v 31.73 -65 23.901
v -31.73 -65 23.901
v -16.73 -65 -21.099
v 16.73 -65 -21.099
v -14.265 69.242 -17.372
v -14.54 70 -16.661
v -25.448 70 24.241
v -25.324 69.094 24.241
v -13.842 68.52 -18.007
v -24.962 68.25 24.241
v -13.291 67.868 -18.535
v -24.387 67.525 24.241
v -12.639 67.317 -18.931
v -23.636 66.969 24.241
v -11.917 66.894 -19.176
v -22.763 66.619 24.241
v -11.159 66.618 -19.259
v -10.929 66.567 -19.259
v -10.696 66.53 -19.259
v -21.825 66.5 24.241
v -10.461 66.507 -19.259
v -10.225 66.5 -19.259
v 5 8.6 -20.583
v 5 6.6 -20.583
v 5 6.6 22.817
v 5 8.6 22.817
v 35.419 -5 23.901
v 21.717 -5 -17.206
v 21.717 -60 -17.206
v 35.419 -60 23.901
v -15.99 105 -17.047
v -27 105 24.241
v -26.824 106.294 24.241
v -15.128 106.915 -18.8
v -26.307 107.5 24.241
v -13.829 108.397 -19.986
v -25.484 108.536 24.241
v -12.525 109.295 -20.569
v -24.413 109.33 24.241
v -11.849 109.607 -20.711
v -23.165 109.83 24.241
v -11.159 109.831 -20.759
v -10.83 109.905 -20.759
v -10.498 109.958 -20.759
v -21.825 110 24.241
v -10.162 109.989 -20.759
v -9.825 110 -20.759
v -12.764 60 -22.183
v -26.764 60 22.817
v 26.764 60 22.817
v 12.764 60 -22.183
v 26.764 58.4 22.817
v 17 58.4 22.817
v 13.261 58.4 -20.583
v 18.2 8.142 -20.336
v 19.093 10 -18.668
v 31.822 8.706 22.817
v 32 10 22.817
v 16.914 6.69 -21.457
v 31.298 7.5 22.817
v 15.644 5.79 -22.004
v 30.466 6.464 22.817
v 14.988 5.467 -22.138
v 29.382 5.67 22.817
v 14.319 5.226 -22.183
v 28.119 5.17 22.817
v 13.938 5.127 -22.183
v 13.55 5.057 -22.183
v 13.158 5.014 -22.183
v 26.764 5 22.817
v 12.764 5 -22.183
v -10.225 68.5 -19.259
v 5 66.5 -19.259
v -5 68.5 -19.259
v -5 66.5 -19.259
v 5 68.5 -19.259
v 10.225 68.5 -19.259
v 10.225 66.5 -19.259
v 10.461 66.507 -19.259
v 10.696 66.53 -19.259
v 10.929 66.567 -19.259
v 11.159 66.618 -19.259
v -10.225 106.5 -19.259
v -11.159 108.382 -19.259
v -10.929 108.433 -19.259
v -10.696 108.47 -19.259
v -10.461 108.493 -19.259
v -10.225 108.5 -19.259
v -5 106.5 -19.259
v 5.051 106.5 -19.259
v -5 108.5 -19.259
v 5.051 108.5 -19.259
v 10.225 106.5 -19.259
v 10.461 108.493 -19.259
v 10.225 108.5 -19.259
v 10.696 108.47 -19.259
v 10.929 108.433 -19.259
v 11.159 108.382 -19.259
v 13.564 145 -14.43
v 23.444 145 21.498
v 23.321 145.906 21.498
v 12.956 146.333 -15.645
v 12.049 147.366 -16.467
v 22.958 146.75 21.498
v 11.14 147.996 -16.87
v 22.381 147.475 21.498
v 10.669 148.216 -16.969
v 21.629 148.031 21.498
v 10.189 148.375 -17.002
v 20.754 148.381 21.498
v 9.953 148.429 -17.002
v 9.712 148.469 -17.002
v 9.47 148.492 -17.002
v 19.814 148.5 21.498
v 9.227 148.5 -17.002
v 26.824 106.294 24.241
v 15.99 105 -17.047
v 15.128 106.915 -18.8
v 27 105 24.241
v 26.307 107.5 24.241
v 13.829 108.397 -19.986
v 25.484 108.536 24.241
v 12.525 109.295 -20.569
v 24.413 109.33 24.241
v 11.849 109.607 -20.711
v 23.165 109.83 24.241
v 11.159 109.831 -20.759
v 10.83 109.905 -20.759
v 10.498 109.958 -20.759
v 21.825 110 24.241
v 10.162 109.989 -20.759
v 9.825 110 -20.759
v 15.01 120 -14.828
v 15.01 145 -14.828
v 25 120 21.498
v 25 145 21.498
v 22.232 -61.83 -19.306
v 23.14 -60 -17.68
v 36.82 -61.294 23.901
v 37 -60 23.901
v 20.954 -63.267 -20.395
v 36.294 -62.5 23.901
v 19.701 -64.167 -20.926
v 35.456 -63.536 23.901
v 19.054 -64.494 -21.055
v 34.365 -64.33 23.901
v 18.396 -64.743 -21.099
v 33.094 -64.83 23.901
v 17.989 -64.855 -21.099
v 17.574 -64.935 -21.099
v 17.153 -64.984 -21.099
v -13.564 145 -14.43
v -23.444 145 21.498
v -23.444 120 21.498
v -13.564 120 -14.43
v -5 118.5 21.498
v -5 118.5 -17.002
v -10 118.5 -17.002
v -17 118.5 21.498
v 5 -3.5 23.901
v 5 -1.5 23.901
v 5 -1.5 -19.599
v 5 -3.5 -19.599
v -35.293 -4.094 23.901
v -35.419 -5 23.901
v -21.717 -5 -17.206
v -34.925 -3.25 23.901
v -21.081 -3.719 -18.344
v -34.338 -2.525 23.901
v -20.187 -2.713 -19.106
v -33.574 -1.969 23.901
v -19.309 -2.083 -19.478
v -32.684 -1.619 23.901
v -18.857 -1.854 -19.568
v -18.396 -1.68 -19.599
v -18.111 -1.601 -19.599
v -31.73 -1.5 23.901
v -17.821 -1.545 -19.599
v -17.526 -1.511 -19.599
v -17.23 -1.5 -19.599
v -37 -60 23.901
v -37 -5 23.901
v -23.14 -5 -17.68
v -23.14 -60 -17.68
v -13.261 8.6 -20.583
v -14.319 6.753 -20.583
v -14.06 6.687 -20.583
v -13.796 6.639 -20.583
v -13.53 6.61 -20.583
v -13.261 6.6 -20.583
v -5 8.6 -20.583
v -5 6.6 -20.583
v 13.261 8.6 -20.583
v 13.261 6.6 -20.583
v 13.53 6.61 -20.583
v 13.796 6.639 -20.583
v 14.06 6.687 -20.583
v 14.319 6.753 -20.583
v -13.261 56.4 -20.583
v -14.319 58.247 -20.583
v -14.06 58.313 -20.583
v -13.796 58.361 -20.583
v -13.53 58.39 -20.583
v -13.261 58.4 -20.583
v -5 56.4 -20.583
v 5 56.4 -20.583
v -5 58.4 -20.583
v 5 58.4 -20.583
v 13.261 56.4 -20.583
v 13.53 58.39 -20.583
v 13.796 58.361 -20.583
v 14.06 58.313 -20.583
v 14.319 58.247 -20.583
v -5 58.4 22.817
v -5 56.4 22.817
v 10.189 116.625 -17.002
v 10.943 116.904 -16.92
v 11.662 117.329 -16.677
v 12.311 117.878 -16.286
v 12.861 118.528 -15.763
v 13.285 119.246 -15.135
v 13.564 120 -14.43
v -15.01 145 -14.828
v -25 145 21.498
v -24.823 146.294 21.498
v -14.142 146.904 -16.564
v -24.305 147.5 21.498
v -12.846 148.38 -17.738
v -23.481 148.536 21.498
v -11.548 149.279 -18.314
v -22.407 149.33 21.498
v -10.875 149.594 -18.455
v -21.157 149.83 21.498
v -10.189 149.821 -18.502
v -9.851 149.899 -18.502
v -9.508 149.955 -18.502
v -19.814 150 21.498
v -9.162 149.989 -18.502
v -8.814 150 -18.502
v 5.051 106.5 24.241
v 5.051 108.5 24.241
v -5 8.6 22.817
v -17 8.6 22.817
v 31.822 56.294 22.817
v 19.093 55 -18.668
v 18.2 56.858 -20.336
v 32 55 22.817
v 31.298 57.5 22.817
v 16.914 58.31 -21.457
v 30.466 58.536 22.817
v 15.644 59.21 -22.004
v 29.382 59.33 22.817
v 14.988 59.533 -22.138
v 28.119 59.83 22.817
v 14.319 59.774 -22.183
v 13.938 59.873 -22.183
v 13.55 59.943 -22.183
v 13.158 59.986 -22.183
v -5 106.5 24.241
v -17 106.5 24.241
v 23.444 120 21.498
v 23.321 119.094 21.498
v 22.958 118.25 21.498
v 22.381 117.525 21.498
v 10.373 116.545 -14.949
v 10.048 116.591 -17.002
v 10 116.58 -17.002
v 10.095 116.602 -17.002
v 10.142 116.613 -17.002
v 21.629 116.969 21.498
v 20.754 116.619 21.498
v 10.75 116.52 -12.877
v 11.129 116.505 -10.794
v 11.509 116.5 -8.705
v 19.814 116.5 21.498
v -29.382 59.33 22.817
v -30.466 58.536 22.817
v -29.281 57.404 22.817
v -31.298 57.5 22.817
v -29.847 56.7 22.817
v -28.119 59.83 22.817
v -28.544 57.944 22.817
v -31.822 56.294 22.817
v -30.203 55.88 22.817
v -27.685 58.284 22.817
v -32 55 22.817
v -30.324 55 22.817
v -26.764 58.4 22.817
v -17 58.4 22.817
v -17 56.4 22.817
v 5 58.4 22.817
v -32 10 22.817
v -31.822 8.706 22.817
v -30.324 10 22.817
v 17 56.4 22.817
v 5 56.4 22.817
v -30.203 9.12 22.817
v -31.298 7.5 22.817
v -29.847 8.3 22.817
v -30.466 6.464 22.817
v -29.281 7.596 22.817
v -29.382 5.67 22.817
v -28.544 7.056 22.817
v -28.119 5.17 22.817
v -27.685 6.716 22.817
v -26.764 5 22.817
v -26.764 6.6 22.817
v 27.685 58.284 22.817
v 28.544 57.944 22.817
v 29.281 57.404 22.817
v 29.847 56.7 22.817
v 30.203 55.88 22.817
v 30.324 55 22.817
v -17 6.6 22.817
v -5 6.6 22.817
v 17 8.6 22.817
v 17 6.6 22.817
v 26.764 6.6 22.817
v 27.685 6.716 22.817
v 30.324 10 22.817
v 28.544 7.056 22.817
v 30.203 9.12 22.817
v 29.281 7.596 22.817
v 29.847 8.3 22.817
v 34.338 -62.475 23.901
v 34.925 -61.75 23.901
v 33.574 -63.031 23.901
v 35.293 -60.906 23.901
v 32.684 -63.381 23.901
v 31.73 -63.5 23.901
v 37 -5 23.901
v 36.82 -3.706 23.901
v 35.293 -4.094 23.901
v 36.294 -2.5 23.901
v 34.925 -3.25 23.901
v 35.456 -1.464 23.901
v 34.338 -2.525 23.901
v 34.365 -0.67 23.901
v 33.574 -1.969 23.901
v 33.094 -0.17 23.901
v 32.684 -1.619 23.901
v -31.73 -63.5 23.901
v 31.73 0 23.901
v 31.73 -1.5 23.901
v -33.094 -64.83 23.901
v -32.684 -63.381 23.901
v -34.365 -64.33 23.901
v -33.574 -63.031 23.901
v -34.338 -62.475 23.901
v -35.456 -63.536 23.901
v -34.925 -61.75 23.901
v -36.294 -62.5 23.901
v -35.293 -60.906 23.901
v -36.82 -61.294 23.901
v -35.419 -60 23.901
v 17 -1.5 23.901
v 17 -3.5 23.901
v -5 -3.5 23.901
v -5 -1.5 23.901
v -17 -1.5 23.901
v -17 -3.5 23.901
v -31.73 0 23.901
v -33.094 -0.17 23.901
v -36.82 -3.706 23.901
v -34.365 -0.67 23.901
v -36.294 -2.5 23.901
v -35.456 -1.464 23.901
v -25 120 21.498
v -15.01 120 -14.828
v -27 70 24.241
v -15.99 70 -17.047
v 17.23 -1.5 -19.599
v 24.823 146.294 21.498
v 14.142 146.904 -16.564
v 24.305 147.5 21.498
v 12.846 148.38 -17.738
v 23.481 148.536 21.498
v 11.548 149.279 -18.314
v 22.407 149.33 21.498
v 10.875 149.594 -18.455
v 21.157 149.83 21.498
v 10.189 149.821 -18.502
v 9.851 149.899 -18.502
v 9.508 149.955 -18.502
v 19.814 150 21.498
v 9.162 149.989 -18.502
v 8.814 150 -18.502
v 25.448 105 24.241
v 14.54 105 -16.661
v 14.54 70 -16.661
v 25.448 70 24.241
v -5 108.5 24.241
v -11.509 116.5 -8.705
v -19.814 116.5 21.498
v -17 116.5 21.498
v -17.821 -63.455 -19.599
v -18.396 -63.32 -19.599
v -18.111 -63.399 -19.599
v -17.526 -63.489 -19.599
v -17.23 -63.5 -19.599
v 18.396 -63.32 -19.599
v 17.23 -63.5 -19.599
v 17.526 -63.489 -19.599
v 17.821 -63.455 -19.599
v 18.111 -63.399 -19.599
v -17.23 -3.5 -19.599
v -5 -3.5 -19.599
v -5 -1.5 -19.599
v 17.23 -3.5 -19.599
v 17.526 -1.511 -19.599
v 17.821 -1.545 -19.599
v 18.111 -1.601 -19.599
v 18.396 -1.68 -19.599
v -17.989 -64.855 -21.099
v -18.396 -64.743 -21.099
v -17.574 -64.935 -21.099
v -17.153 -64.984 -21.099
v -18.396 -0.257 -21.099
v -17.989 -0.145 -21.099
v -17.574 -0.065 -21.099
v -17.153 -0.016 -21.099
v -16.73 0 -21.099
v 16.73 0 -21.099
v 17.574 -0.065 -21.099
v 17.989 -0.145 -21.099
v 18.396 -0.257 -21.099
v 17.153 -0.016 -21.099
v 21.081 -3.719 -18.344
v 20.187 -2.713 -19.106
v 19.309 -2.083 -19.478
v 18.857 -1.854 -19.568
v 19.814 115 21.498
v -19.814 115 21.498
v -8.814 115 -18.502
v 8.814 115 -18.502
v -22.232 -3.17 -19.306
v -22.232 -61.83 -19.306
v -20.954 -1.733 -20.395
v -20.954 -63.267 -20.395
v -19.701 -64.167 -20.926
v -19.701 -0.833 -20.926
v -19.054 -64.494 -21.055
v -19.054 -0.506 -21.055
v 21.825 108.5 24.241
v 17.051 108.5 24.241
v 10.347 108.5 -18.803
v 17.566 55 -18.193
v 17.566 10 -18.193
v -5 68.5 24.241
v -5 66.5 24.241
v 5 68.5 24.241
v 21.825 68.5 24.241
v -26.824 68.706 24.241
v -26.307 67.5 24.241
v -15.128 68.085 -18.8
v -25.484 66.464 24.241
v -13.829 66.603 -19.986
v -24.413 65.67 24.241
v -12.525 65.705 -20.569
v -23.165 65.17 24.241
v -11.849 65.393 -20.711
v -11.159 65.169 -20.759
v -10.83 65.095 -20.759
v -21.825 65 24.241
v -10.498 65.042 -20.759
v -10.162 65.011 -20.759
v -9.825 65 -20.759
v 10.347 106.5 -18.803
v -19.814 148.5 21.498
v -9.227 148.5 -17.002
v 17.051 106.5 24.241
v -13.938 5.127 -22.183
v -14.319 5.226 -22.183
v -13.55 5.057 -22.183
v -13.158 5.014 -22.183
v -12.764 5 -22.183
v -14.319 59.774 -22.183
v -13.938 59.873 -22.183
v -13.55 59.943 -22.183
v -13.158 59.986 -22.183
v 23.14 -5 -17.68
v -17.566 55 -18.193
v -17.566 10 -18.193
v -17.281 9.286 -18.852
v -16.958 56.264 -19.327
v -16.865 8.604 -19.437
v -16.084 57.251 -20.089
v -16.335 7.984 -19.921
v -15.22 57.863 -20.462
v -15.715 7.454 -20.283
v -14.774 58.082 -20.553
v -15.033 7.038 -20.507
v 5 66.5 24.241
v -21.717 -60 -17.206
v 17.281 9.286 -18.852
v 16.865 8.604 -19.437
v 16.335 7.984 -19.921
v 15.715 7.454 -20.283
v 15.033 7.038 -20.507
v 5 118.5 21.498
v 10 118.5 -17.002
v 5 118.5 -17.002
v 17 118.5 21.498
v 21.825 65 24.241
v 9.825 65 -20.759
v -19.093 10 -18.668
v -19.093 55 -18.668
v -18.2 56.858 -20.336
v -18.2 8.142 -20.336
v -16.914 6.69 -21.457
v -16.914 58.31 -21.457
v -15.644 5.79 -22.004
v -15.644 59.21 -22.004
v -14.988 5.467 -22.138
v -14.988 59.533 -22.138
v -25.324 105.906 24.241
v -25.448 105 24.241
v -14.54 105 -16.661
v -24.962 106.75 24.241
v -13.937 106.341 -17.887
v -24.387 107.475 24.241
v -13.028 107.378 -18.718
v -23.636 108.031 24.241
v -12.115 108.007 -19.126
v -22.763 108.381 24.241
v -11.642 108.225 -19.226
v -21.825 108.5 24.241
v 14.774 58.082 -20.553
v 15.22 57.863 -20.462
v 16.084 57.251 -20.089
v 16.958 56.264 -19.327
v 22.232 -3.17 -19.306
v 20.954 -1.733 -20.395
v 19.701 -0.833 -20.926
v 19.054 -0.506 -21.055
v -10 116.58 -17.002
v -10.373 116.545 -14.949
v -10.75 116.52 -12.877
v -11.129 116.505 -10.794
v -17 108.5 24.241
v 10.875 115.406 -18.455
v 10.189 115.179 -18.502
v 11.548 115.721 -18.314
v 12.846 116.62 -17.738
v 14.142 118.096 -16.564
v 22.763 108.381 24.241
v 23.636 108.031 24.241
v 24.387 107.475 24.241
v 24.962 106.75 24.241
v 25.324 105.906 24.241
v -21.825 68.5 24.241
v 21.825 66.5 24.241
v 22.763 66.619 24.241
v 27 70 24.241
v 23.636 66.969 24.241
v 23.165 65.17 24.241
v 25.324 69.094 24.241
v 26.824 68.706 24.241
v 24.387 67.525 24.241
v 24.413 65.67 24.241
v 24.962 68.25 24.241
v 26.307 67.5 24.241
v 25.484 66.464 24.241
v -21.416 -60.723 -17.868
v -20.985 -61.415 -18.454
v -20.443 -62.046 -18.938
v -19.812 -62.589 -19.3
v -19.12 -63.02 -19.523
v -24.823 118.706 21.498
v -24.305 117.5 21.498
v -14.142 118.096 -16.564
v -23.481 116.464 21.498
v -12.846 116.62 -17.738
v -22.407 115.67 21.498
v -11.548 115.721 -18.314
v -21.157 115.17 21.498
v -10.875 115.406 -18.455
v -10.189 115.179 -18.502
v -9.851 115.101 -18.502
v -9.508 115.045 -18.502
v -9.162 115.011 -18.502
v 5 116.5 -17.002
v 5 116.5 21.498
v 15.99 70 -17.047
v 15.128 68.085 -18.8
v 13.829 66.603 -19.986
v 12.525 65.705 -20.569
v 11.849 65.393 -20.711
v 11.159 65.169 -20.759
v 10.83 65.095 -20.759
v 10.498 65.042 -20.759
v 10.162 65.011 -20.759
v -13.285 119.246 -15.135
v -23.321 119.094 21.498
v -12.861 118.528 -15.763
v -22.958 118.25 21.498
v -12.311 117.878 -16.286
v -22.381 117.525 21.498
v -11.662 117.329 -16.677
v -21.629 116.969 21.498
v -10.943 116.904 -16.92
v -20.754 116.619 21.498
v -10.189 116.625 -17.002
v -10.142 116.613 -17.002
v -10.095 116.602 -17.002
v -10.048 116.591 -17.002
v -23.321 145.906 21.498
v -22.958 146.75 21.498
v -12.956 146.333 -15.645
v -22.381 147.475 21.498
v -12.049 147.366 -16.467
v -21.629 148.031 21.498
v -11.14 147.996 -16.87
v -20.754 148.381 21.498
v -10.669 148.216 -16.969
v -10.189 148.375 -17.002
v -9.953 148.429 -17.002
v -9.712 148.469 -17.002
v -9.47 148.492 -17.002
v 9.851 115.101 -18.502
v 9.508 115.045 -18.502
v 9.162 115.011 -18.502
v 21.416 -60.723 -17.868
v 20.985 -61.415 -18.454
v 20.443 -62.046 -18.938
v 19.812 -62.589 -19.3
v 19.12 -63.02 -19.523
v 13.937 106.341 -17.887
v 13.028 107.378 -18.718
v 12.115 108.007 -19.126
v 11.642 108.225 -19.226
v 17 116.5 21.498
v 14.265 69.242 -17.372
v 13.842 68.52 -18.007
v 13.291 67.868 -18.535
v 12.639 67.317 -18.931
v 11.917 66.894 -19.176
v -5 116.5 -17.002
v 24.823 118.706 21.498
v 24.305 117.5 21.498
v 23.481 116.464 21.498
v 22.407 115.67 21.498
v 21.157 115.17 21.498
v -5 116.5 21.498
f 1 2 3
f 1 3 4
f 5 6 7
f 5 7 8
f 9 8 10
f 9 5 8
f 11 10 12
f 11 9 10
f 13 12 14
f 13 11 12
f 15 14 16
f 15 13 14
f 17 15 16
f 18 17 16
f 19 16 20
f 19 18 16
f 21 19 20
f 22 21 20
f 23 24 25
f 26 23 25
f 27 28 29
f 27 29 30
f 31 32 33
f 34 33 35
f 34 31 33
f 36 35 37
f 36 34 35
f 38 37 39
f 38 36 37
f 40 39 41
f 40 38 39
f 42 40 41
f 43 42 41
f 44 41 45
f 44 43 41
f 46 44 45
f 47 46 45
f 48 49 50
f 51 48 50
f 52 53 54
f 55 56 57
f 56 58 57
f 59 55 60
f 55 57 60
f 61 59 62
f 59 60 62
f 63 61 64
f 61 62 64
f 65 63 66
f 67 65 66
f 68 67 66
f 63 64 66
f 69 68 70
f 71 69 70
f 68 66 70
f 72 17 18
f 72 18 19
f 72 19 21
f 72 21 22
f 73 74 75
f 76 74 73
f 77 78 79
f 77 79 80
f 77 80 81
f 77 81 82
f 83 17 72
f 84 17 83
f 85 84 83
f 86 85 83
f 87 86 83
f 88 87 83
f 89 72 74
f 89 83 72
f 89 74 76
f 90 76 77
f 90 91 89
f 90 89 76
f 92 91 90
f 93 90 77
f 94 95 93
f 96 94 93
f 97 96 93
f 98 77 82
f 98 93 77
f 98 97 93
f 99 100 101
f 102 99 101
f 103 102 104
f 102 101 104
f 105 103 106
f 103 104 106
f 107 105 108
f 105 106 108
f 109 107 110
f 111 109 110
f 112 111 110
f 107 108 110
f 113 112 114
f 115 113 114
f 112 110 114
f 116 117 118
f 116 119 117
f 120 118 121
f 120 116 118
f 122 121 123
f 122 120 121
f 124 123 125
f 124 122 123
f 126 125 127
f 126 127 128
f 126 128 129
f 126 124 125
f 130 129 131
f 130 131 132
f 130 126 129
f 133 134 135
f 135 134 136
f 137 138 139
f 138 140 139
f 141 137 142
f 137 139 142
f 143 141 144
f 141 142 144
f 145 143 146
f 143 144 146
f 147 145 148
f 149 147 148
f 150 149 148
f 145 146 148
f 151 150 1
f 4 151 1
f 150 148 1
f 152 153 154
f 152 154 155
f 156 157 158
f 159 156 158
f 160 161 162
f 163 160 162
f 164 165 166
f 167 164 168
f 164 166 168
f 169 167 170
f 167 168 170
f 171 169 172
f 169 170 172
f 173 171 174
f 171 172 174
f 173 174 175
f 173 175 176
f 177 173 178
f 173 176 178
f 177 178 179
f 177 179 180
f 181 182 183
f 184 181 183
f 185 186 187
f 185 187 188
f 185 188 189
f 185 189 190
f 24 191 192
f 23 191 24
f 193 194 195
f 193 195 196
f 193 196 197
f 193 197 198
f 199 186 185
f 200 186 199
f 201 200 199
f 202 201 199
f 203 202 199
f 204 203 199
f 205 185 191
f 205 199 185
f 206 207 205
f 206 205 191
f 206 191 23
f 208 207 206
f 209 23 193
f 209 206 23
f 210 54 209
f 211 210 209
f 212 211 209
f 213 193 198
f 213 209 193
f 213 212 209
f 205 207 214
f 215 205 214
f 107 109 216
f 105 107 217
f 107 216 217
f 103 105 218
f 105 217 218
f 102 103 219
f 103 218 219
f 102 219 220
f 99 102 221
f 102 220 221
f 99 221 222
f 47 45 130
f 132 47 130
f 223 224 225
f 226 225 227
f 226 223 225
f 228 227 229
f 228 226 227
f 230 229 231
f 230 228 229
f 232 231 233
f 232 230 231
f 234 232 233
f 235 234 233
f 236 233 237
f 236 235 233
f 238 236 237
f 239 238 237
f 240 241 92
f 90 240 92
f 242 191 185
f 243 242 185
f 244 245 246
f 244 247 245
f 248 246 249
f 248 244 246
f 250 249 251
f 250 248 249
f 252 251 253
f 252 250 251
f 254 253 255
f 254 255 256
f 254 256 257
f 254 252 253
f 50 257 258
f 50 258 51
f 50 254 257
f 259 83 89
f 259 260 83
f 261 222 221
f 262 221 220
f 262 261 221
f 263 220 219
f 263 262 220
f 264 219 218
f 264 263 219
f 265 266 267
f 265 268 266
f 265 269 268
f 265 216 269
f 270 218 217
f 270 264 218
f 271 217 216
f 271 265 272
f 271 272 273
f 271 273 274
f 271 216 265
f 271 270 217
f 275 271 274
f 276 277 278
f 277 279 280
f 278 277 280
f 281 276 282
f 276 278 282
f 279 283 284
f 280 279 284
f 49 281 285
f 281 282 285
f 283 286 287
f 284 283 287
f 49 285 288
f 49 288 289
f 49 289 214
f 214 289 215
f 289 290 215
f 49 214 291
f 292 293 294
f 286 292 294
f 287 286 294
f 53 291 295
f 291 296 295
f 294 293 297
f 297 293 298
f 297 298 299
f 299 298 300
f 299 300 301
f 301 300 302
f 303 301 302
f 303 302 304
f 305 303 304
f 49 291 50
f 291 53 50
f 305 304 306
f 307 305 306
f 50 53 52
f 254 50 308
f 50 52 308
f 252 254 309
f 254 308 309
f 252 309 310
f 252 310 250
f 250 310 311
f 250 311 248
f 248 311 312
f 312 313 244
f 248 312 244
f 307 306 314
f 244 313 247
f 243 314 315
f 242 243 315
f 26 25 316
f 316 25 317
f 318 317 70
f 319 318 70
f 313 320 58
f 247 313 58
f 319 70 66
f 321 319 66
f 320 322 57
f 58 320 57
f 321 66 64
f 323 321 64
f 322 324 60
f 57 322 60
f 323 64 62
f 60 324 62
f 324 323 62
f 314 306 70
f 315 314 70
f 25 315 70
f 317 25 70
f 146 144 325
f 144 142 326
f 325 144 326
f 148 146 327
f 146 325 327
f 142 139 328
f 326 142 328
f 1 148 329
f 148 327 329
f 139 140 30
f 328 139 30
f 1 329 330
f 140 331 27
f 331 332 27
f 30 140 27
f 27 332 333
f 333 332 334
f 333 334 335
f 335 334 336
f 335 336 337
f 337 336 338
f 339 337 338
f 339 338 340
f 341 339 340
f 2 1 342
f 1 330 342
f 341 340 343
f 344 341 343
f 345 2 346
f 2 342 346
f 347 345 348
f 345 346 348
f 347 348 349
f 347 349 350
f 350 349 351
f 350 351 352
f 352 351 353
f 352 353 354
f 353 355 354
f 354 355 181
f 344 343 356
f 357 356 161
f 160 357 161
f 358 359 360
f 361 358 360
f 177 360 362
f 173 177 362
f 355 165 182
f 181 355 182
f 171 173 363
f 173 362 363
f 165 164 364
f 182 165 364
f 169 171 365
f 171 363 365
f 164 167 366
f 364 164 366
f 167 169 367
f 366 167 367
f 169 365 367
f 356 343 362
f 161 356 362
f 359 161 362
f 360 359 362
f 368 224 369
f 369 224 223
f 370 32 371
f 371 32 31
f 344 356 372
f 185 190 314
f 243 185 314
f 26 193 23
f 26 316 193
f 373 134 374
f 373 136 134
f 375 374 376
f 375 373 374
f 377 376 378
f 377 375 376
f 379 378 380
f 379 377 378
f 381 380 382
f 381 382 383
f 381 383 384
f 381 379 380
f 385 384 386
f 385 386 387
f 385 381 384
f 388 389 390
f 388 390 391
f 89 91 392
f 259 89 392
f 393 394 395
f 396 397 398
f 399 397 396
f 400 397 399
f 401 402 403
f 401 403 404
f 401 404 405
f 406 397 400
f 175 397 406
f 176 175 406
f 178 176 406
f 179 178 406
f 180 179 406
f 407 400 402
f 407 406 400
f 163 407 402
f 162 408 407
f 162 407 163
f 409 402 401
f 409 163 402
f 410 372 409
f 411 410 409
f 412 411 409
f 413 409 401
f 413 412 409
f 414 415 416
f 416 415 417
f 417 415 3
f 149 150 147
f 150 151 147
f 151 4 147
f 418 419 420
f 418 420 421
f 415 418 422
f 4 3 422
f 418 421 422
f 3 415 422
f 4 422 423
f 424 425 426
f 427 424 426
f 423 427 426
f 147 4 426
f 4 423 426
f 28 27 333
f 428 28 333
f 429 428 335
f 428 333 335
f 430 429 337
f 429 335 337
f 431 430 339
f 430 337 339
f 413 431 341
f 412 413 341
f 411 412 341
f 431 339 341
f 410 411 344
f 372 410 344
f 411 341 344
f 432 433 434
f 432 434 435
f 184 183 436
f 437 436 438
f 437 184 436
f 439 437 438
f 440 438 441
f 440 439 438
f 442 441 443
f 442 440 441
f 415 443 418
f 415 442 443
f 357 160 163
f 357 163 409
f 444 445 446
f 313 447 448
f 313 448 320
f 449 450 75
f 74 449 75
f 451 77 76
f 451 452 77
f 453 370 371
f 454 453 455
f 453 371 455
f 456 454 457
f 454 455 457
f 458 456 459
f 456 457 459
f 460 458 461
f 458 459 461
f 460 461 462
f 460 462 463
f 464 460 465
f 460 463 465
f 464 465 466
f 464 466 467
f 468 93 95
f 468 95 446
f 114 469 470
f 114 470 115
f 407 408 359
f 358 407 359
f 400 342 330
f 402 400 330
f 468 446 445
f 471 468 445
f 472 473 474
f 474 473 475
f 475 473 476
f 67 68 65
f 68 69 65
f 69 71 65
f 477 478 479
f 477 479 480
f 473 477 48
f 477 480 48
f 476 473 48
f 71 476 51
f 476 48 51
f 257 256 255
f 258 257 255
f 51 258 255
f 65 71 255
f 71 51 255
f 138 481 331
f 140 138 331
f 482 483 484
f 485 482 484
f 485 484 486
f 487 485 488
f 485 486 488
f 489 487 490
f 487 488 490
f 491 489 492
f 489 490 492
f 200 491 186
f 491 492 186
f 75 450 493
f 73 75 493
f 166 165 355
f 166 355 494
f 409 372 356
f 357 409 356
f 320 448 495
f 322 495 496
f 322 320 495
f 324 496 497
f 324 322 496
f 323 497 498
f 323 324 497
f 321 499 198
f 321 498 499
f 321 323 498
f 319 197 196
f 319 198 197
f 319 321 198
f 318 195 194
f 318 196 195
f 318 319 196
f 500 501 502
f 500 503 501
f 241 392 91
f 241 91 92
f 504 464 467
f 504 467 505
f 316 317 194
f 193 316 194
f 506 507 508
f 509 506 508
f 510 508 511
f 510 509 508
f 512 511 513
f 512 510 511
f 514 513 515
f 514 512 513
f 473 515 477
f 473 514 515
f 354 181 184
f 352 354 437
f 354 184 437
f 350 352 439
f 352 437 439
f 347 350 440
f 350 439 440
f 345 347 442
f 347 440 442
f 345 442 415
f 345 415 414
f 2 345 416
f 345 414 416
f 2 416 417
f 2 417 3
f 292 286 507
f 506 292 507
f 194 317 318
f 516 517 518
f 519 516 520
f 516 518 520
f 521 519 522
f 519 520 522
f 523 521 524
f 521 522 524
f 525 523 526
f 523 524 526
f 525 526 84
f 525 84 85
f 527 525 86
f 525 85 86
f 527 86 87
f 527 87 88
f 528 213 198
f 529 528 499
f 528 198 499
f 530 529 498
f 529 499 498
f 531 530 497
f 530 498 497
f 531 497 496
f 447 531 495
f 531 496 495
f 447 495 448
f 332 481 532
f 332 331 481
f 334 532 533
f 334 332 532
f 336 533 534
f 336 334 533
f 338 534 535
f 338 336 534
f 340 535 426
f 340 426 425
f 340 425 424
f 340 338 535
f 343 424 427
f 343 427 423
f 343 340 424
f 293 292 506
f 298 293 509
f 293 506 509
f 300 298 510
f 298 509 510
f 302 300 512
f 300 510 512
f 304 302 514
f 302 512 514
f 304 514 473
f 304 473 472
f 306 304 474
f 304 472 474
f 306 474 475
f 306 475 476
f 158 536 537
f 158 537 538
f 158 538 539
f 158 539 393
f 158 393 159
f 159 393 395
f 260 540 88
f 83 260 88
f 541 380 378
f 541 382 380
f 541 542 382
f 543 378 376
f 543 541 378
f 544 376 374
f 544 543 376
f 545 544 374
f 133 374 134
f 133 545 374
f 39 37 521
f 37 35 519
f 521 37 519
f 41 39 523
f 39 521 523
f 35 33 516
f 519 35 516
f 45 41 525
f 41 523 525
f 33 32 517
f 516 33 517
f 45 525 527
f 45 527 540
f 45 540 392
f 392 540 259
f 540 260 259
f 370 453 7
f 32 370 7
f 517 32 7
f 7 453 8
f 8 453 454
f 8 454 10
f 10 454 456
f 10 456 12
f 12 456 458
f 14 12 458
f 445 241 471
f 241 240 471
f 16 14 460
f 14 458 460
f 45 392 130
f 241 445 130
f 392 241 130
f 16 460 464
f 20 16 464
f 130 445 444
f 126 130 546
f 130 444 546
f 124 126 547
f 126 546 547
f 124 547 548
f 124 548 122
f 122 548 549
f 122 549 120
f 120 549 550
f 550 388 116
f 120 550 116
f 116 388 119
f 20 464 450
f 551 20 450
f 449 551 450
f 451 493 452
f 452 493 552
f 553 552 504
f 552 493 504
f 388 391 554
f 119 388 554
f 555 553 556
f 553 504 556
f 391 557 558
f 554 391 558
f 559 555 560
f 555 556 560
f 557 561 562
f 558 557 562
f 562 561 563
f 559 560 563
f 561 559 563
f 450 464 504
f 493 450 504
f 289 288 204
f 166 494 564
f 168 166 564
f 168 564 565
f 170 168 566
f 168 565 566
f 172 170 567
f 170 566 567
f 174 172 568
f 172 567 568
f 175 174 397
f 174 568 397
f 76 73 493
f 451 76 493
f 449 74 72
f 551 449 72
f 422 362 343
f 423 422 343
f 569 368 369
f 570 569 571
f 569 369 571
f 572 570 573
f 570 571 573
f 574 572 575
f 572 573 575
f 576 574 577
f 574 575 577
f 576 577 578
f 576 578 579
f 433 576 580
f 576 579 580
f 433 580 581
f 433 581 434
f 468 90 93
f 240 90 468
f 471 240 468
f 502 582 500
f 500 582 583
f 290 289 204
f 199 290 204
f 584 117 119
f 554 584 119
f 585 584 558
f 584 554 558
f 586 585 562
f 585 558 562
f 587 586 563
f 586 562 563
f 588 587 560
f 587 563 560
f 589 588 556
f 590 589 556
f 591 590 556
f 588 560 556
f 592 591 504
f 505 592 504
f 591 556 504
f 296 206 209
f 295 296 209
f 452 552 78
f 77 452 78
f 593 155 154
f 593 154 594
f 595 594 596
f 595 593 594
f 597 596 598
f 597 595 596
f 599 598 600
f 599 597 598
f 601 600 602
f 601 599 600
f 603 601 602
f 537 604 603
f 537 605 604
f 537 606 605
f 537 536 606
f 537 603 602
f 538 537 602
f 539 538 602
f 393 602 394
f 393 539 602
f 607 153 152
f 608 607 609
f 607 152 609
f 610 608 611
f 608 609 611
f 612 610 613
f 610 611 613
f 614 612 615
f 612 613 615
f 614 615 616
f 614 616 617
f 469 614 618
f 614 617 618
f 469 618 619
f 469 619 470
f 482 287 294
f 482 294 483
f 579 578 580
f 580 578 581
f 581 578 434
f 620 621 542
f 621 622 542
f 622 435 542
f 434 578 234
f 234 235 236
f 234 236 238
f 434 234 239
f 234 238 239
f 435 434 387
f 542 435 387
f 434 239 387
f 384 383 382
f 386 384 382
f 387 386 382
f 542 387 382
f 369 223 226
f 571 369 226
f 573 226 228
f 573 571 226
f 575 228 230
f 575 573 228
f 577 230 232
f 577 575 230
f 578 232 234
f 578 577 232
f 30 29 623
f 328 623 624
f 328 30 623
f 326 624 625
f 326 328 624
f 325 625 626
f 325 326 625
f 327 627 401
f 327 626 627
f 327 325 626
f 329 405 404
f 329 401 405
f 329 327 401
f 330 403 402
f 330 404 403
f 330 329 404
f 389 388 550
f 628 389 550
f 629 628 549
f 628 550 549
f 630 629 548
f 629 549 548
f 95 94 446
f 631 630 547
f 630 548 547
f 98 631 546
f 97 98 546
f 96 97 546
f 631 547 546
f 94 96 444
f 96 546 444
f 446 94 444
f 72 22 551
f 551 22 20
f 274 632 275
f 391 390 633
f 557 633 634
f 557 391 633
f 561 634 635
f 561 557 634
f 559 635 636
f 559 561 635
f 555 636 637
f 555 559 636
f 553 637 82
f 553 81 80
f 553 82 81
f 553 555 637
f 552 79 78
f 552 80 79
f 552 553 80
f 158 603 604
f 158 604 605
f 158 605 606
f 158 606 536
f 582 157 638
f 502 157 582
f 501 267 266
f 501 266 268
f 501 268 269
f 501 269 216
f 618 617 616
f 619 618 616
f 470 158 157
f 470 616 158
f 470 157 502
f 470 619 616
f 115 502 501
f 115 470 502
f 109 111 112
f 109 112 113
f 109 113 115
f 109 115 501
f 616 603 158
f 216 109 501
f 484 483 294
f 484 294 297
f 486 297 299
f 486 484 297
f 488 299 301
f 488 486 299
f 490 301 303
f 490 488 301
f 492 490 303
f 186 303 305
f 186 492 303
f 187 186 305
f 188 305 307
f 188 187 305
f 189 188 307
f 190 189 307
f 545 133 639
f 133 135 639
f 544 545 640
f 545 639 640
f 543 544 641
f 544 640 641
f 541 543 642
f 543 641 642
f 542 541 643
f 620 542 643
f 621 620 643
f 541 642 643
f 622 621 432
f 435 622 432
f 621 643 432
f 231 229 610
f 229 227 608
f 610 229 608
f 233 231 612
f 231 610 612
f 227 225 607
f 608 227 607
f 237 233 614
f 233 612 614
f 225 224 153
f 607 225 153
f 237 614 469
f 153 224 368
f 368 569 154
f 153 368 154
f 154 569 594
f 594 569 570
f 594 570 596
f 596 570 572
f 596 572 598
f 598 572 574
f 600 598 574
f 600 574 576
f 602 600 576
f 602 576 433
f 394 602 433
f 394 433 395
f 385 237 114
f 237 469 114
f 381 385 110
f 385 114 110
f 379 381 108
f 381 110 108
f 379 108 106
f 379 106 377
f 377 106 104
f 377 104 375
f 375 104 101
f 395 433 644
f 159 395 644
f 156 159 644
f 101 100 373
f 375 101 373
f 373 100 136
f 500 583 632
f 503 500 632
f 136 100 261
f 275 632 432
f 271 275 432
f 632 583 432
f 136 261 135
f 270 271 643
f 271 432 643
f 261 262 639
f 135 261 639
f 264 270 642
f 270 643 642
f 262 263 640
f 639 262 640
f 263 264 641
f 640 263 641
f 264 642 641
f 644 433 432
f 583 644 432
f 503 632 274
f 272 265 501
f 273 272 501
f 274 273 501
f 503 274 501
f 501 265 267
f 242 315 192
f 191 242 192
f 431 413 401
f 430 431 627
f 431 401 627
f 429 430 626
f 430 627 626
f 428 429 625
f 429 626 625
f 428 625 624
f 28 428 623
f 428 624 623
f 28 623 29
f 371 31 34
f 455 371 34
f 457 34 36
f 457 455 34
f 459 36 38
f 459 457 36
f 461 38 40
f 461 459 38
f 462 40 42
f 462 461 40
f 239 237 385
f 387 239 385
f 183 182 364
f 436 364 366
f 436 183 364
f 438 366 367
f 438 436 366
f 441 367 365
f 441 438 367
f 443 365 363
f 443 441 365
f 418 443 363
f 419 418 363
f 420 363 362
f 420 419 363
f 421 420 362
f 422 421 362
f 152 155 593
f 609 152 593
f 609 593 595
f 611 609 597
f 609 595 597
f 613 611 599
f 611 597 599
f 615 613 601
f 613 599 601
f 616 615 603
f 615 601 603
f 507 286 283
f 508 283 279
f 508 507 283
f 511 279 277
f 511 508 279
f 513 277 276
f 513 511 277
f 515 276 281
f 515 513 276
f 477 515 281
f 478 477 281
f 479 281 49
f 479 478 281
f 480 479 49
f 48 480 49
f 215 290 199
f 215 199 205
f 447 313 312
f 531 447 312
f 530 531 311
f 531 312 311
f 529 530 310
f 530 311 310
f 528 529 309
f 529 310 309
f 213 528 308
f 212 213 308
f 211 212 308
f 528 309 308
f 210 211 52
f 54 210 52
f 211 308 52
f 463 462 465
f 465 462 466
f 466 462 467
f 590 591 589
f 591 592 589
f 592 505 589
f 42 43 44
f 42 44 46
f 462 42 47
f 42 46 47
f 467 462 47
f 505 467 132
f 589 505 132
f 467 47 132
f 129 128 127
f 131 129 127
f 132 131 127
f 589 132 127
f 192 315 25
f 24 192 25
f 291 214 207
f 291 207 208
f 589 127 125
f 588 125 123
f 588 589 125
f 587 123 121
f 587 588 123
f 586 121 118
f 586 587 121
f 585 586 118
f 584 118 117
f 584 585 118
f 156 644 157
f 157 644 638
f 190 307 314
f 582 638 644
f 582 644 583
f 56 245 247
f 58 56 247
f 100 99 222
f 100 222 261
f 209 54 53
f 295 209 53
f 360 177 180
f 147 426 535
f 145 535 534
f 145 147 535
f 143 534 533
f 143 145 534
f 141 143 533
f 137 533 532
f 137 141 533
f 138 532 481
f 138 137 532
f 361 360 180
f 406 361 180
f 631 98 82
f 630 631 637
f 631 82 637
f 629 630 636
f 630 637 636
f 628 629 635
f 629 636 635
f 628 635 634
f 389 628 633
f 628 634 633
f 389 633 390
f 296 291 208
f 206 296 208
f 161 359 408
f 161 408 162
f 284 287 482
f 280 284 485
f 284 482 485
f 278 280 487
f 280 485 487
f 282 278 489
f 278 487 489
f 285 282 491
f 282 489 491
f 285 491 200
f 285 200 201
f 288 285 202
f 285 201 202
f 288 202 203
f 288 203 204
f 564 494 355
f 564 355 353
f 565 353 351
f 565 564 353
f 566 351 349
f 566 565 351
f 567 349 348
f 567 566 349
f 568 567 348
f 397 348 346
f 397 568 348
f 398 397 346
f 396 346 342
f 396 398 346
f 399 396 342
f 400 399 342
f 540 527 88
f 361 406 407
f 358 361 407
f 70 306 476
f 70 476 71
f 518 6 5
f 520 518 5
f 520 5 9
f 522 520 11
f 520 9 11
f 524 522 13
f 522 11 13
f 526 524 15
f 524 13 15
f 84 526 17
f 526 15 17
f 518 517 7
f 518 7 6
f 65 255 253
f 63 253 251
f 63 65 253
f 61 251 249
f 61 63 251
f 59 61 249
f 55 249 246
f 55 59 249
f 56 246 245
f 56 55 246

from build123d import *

# Parameters (mm, degrees)
F1_DEPTH  = 65
F2_R      = 5
F5_DEPTH  = 55
F6_R      = 5
F9_DEPTH  = 45
F10_R     = 5
F13_DEPTH = 35
F14_R     = 5
F15_T     = -1.6
F16_T     = -1.5
F17_T     = -1.5
F18_T     = -1.5
F20_DEPTH = 2
F22_DEPTH = 2
F24_DEPTH = 2
F26_DEPTH = 2
F28_DEPTH = 2
F30_DEPTH = 2


# Not quite as in the source:
# - a feature names something its author has since deleted; it is built from what else it names


with BuildPart() as f1:
    # F0 (on Front) → F1 (new body)
    with BuildSketch(Plane.XZ):
        Polygon((37, 23.9011184353), (0, 23.9011184353), (-37, 23.9011184353), (-22, -21.0988815647), (0, -21.0988815647), (22, -21.0988815647), align=None)
    extrude(amount=F1_DEPTH)

    # F2
    f2_edges = [f1.edges().sort_by_distance(p)[0] for p in [
        (-22, -32.5, -21.098882),
        (22, -32.5, -21.098882),
        (-29.5, -65, 1.401118),
        (29.5, -65, 1.401118),
        (29.5, 0, 1.401118),
        (-29.5, 0, 1.401118),
    ]]
    fillet(f2_edges, radius=F2_R)

    # F17
    f17_openings = [f1.faces().sort_by_distance(p)[0] for p in [
        (0, -32.5, 23.901118),
    ]]
    offset(amount=F17_T, openings=f17_openings)

    # F29 (on face) → F30 (join)
    with BuildSketch(Plane.XZ.offset(1.5)):
        Polygon((-5, -19.5988815647), (-5, 23.9011184353), (-17, 23.9011184353), (-17.2295372331, -19.5988815647), align=None)
        Polygon((17, 23.9011184353), (5, 23.9011184353), (5, -19.5988815647), (17.2295372331, -19.5988815647), align=None)
    extrude(amount=F30_DEPTH)


with BuildPart() as f5:
    # F4 (on offset) → F5 (new body)
    with BuildSketch(Plane.XZ.offset(-60)):
        Polygon((32, 22.8169034502), (0, 22.8169034502), (-32, 22.8169034502), (-18, -22.1830965498), (0, -22.1830965498), (18, -22.1830965498), align=None)
    extrude(amount=F5_DEPTH)

    # F6
    f6_edges = [f5.edges().sort_by_distance(p)[0] for p in [
        (25, 60, 0.316903),
        (-25, 60, 0.316903),
        (18, 32.5, -22.183097),
        (-18, 32.5, -22.183097),
        (-25, 5, 0.316903),
        (25, 5, 0.316903),
    ]]
    fillet(f6_edges, radius=F6_R)

    # F15
    f15_openings = [f5.faces().sort_by_distance(p)[0] for p in [
        (0, 32.5, 22.816903),
    ]]
    offset(amount=F15_T, openings=f15_openings)

    # F25 (on face) → F26 (join)
    with BuildSketch(Plane.XZ.offset(-58.4)):
        Polygon((-5, -20.5830965498), (-5, 22.8169034502), (-17, 22.8169034502), (-13.2613903698, -20.5830965498), align=None)
        Polygon((17, 22.8169034502), (5, 22.8169034502), (5, -20.5830965498), (13.2613903698, -20.5830965498), align=None)
    extrude(amount=F26_DEPTH)

    # F27 (on face) → F28 (join)
    with BuildSketch(Plane(origin=(0, 6.6, 0), x_dir=(-1, 0, 0), z_dir=(0, 1, 0))):
        Polygon((5, 22.8169034502), (5, -20.5830965498), (13.2613903698, -20.5830965498), (17, 22.8169034502), align=None)
        Polygon((-13.2613903698, -20.5830965498), (-5, -20.5830965498), (-5, 22.8169034502), (-17, 22.8169034502), align=None)
    extrude(amount=F28_DEPTH)


with BuildPart() as f9:
    # F8 (on offset) → F9 (new body)
    with BuildSketch(Plane.XZ.offset(-110)):
        Polygon((27, 24.2408766891), (0, 24.2408766891), (-27, 24.2408766891), (-15, -20.7591233109), (0, -20.7591233109), (15, -20.7591233109), align=None)
    extrude(amount=F9_DEPTH)

    # F10
    f10_edges = [f9.edges().sort_by_distance(p)[0] for p in [
        (21, 110, 1.740877),
        (-21, 110, 1.740877),
        (15, 87.5, -20.759123),
        (-15, 87.5, -20.759123),
        (21, 65, 1.740877),
        (-21, 65, 1.740877),
    ]]
    fillet(f10_edges, radius=F10_R)

    # F18
    f18_openings = [f9.faces().sort_by_distance(p)[0] for p in [
        (0, 87.5, 24.240877),
    ]]
    offset(amount=F18_T, openings=f18_openings)

    # F19 (on face) → F20 (join)
    with BuildSketch(Plane.XZ.offset(-108.5)):
        Polygon((-10.2252751012, -19.2591233109), (-5, -19.2591233109), (-5, 24.2408766891), (-17, 24.2408766891), align=None)
        Polygon((5.0505502025, 24.2408766891), (5.0505502025, -19.2591233109), (10.2252751012, -19.2591233109), (10.346798193, -18.8034117168), (17.0505502025, 24.2408766891), align=None)
    extrude(amount=F20_DEPTH)

    # F21 (on face) → F22 (join)
    with BuildSketch(Plane(origin=(0, 66.5, 0), x_dir=(-1, 0, 0), z_dir=(0, 1, 0))):
        Polygon((-10.2252751012, -19.2591233109), (-5, -19.2591233109), (-5, 24.2408766891), (-21.8252751012, 24.2408766891), align=None)
        Polygon((5, -19.2591233109), (10.2252751012, -19.2591233109), (21.8252751012, 24.2408766891), (5, 24.2408766891), align=None)
    extrude(amount=F22_DEPTH)


with BuildPart() as f13:
    # F12 (on offset) → F13 (new body)
    with BuildSketch(Plane.XZ.offset(-150)):
        Polygon((25, 21.4980914434), (0, 21.4980914434), (-25, 21.4980914434), (-14, -18.5019085566), (0, -18.5019085566), (14, -18.5019085566), align=None)
    extrude(amount=F13_DEPTH)

    # F14
    f14_edges = [f13.edges().sort_by_distance(p)[0] for p in [
        (19.5, 150, 1.498091),
        (-19.5, 150, 1.498091),
        (14, 132.5, -18.501909),
        (-14, 132.5, -18.501909),
        (19.5, 115, 1.498091),
        (-19.5, 115, 1.498091),
    ]]
    fillet(f14_edges, radius=F14_R)

    # F16
    f16_openings = [f13.faces().sort_by_distance(p)[0] for p in [
        (0, 132.5, 21.498091),
    ]]
    offset(amount=F16_T, openings=f16_openings)

    # F23 (on face) → F24 (join)
    with BuildSketch(Plane(origin=(0, 116.5, 0), x_dir=(-1, 0, 0), z_dir=(0, 1, 0))):
        Polygon((-10, -17.0019085566), (-5, -17.0019085566), (-5, 21.4980914434), (-17, 21.4980914434), align=None)
        Polygon((5, 21.4980914434), (5, -17.0019085566), (10, -17.0019085566), (17, 21.4980914434), align=None)
        Polygon((5, 21.4980914434), (5, -17.0019085566), (9.2268828718, -17.0019085566), (11.5085212257, -8.7050418152), (17, 21.4980914434), align=None)
    extrude(amount=F24_DEPTH)


solid = Compound([f1.part, f5.part, f9.part, f13.part])
